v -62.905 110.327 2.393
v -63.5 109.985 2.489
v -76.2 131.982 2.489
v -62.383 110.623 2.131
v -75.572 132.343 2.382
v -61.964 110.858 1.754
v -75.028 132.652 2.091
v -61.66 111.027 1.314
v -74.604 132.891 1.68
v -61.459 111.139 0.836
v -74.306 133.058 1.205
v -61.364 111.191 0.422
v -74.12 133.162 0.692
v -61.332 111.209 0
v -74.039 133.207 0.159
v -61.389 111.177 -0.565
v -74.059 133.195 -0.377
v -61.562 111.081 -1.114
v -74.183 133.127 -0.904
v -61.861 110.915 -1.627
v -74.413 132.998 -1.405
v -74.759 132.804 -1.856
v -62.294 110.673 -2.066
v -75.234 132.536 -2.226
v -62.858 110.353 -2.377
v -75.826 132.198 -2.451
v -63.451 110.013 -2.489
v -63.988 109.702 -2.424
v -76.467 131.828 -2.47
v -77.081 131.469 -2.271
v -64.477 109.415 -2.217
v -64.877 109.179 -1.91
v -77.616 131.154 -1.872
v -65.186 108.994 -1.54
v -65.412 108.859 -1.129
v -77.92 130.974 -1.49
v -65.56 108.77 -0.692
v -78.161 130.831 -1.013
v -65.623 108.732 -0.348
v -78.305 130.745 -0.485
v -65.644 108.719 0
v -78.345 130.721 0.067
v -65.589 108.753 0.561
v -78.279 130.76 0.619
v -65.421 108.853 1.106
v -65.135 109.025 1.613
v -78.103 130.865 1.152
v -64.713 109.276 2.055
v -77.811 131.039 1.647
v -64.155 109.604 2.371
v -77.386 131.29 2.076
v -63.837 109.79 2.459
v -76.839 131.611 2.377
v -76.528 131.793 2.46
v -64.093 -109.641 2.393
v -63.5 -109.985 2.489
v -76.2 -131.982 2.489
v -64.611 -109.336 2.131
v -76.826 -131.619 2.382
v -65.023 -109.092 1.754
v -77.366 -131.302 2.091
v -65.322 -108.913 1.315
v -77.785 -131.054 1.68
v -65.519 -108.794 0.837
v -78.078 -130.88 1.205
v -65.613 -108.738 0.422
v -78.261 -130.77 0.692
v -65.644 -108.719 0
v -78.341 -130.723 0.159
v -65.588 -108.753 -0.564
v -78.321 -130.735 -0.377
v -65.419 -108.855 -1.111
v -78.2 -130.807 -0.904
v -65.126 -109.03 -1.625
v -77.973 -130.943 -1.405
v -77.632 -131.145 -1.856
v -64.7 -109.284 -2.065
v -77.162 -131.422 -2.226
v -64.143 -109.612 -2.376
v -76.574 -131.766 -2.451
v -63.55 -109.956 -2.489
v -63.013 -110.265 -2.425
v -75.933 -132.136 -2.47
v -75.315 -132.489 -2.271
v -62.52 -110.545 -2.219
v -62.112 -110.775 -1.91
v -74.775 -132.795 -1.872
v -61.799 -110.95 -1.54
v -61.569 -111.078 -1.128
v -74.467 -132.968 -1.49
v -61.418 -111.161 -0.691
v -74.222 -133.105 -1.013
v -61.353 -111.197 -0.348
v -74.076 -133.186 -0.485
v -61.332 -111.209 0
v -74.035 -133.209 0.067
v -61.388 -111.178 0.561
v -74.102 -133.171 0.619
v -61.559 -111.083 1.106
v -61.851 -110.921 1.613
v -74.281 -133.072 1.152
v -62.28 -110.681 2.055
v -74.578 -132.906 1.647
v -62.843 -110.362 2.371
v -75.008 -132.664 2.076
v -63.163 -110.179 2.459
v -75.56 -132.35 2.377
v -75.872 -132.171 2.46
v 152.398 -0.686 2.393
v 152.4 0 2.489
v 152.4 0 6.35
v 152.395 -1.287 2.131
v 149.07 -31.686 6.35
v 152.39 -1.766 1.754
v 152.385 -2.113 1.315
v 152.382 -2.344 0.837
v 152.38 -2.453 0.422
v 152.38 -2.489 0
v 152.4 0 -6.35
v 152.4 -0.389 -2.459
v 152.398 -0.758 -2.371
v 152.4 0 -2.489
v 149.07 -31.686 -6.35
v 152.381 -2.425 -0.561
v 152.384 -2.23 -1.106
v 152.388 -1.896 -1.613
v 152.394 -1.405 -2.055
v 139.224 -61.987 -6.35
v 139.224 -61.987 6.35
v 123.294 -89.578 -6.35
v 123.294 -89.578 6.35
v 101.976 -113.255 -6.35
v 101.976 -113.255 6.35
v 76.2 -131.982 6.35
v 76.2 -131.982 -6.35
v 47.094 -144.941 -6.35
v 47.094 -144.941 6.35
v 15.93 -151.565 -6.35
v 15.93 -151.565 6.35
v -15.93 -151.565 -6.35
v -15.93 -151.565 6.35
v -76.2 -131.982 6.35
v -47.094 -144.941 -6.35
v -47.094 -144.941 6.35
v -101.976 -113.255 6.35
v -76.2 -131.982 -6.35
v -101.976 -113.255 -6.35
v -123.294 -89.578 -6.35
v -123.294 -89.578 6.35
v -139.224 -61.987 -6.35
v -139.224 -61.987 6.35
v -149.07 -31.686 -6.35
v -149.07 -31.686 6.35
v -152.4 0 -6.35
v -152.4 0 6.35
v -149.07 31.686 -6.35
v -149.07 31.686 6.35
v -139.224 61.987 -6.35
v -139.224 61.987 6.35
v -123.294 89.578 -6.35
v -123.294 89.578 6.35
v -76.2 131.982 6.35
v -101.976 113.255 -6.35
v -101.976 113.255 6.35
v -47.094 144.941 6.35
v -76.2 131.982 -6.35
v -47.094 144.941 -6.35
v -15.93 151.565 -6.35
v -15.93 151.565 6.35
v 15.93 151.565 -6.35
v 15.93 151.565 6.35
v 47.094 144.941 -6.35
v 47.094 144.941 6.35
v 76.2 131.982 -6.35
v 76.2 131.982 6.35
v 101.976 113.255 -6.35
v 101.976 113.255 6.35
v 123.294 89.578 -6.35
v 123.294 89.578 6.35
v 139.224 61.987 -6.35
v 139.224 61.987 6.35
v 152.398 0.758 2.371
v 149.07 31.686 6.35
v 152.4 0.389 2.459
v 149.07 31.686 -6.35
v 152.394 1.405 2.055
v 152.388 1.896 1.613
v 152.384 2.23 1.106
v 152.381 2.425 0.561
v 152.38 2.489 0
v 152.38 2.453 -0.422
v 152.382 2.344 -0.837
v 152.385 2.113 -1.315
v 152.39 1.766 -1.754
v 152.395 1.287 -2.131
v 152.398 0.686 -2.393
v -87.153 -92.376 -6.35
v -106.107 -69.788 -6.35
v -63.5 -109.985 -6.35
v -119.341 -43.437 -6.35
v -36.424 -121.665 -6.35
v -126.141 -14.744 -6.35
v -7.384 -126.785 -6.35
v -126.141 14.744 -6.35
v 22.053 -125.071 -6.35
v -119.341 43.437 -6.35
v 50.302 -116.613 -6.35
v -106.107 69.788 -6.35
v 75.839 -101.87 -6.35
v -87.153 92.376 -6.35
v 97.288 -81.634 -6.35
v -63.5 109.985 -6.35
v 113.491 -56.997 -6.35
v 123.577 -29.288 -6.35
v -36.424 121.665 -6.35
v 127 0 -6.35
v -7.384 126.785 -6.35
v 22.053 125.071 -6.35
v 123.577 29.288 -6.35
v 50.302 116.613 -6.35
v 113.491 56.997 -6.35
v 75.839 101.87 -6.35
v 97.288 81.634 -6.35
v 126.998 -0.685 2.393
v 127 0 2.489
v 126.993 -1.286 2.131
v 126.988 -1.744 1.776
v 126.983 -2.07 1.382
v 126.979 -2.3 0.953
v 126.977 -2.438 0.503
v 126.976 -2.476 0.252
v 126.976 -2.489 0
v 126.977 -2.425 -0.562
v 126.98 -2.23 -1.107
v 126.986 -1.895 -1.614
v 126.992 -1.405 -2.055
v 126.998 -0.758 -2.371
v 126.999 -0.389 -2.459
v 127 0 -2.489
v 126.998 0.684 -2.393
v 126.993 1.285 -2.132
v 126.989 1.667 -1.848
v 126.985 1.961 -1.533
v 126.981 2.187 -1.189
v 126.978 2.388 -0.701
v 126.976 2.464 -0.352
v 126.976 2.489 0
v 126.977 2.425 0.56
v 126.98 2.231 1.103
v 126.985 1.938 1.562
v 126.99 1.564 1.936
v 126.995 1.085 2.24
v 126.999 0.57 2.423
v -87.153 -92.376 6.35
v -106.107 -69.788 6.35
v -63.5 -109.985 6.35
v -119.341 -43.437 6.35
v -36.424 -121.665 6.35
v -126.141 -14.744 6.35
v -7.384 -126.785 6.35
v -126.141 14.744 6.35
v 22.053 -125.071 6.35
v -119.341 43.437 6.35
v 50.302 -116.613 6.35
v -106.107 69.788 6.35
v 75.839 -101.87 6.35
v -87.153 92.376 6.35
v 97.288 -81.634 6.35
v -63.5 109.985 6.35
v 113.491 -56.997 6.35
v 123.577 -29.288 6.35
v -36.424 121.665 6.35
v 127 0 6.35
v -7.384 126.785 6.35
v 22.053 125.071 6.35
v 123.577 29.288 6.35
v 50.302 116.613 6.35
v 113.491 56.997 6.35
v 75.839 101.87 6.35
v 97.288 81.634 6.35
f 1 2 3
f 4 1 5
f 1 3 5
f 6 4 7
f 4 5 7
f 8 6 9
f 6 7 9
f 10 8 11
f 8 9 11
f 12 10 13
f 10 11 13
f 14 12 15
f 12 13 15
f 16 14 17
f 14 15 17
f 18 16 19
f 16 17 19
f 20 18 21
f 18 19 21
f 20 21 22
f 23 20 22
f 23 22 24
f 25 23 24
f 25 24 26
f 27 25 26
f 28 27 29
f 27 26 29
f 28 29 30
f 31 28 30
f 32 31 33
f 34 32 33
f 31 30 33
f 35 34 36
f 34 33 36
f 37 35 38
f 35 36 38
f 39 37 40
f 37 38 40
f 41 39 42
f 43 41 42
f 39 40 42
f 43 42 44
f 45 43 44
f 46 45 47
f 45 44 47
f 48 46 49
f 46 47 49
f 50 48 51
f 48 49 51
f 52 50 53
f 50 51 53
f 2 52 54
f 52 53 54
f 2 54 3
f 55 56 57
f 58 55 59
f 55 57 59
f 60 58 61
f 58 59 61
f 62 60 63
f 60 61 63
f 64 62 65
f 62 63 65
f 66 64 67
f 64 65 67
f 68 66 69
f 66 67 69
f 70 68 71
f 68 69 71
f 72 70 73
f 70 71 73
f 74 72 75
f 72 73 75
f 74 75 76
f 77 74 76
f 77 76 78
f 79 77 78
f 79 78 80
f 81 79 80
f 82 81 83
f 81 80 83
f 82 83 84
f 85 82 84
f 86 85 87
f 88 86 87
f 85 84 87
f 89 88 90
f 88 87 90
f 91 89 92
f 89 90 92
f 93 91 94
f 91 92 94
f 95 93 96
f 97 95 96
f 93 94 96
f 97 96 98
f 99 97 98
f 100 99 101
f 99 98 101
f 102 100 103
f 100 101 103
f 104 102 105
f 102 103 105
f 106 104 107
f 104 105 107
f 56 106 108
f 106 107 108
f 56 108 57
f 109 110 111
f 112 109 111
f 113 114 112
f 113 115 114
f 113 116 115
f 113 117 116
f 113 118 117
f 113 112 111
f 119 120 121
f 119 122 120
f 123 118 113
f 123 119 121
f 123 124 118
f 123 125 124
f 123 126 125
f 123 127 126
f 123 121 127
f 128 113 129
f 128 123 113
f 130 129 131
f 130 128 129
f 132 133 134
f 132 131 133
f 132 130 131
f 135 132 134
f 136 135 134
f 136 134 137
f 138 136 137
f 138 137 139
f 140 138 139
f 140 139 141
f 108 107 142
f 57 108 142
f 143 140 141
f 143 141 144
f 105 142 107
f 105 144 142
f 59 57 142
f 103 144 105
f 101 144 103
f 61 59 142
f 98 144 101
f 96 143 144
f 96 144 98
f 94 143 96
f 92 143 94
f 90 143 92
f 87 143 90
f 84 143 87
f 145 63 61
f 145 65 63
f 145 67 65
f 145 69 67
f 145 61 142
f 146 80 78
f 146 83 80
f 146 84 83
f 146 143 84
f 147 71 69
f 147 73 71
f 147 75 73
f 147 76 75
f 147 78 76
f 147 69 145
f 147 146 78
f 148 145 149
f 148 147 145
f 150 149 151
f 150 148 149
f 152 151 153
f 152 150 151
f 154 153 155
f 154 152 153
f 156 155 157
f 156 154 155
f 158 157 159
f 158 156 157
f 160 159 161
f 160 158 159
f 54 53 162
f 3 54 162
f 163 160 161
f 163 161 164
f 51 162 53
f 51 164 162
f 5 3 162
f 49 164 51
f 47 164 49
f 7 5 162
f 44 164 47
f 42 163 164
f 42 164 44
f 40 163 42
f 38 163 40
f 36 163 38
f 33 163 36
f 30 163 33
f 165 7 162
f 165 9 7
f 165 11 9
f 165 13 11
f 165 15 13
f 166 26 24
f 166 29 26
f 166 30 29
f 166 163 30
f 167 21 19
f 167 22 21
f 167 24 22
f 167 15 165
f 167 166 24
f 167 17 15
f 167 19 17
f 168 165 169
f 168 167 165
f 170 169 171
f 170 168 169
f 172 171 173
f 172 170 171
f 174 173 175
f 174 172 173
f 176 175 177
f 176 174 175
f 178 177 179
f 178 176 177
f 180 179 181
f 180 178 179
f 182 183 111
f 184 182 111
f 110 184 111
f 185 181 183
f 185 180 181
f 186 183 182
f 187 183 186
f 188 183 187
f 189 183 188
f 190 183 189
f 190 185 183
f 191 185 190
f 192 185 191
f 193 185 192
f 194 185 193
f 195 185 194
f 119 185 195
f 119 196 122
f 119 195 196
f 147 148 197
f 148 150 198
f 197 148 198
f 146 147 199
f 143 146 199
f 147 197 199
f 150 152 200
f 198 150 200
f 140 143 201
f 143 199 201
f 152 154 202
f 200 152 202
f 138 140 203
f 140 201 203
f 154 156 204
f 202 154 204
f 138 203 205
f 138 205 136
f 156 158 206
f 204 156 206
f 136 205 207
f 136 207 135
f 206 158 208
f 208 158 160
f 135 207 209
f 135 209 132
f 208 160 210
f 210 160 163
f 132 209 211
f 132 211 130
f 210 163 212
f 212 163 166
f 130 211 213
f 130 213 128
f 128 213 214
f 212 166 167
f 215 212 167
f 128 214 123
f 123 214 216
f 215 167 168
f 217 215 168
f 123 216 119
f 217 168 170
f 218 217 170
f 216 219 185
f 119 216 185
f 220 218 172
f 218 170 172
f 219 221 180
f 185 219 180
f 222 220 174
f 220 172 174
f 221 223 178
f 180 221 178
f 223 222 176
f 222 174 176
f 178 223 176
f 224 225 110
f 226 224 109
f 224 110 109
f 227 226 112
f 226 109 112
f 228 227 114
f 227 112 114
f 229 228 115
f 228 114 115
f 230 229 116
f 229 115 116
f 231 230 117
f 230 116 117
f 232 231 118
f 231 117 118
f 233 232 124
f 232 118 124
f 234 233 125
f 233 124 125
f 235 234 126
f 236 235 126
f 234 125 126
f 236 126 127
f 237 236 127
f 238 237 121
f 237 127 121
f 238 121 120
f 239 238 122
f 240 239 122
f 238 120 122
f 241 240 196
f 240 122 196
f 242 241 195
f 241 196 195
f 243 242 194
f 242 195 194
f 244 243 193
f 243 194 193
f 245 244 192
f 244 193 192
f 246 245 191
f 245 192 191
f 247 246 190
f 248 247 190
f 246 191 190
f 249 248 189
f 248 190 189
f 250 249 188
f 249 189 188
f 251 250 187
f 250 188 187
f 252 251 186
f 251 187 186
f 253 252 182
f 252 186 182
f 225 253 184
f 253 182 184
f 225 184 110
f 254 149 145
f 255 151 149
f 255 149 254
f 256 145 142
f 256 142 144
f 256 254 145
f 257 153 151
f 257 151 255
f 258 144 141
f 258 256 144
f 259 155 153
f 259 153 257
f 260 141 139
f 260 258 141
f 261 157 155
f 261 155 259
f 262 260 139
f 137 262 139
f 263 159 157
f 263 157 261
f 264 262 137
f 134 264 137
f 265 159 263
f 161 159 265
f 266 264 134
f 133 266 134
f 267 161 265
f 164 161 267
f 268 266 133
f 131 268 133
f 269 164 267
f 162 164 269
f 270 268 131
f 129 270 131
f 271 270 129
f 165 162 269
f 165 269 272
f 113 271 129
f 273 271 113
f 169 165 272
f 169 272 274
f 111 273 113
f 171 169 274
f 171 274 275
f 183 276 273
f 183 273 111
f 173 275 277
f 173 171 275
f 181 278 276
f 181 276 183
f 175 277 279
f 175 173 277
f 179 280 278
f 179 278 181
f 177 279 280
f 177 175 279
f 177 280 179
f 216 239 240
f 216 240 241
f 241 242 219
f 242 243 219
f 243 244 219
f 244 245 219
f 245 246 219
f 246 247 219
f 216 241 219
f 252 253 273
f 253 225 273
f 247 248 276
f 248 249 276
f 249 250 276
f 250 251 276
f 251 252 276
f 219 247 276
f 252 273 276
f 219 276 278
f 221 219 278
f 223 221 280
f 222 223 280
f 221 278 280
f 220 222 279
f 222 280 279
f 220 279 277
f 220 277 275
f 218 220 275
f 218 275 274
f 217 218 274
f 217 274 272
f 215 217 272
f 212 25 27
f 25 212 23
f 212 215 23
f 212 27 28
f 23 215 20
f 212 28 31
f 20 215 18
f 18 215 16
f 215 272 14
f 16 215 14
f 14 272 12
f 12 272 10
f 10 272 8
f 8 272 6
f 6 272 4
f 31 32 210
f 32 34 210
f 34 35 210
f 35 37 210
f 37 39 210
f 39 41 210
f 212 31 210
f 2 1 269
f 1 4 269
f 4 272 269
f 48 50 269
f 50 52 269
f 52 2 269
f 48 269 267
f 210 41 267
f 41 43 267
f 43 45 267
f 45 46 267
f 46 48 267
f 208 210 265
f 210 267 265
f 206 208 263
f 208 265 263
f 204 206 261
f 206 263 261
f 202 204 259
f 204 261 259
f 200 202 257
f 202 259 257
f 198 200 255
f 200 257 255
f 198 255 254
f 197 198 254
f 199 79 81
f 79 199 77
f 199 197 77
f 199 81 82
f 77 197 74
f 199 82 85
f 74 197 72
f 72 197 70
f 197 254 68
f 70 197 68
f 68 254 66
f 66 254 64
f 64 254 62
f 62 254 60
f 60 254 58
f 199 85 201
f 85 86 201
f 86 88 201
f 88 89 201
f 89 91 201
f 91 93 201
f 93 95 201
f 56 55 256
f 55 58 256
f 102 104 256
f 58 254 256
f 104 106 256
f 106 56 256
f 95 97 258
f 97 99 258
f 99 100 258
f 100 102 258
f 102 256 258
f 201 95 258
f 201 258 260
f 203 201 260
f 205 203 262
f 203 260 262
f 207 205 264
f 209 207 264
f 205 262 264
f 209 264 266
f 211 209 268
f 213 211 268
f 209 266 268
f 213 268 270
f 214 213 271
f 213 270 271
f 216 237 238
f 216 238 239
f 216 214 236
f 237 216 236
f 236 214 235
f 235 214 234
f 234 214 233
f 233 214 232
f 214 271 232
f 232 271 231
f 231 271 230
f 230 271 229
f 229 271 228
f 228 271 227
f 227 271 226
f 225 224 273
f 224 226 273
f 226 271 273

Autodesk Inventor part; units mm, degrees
ref_plane "XZ Plane" through (0, 0, 0) normal (0, 1, 0) x (-1, 0, 0)
ref_plane "XY Plane" through (0, 0, 0) normal (0, 0, 1) x (1, 0, 0)
sketch "Sketch1" plane through (0, 0, 0) normal (0, 0, 1) x (1, 0, 0)
  circle A0 centre (0, 0) radius 127
  circle A1 centre (0, 0) radius 152.4
  dimension "d0" = 254
  dimension "d1" = 25.4
extrude "Extrusion1" add sketch "Sketch1" along normal mid plane 12.7
ref_plane "Work Plane1" through (123.825, 0, 0) normal (1, 0, 0) x (0, 1, 0)
sketch "Sketch3" plane through (123.825, 0, 0) normal (1, 0, 0) x (0, 1, 0)
  point P0 (0, 0)
  point P1 (0, 0)
hole "Hole1" at (123.825, 0, 0) at (123.825, 0, 0) direction (1, 0, 0) diameter 4.9784 end through all thread size "1/4-20 UNC" class "2B" standard "ANSI Unified Screw Threads"
pattern_circular "Circular Pattern1" count 3 over 360 about axis through (0, 0, -10) along (0, 0, 1) of "Hole1"
properties part number "ring_middle"
